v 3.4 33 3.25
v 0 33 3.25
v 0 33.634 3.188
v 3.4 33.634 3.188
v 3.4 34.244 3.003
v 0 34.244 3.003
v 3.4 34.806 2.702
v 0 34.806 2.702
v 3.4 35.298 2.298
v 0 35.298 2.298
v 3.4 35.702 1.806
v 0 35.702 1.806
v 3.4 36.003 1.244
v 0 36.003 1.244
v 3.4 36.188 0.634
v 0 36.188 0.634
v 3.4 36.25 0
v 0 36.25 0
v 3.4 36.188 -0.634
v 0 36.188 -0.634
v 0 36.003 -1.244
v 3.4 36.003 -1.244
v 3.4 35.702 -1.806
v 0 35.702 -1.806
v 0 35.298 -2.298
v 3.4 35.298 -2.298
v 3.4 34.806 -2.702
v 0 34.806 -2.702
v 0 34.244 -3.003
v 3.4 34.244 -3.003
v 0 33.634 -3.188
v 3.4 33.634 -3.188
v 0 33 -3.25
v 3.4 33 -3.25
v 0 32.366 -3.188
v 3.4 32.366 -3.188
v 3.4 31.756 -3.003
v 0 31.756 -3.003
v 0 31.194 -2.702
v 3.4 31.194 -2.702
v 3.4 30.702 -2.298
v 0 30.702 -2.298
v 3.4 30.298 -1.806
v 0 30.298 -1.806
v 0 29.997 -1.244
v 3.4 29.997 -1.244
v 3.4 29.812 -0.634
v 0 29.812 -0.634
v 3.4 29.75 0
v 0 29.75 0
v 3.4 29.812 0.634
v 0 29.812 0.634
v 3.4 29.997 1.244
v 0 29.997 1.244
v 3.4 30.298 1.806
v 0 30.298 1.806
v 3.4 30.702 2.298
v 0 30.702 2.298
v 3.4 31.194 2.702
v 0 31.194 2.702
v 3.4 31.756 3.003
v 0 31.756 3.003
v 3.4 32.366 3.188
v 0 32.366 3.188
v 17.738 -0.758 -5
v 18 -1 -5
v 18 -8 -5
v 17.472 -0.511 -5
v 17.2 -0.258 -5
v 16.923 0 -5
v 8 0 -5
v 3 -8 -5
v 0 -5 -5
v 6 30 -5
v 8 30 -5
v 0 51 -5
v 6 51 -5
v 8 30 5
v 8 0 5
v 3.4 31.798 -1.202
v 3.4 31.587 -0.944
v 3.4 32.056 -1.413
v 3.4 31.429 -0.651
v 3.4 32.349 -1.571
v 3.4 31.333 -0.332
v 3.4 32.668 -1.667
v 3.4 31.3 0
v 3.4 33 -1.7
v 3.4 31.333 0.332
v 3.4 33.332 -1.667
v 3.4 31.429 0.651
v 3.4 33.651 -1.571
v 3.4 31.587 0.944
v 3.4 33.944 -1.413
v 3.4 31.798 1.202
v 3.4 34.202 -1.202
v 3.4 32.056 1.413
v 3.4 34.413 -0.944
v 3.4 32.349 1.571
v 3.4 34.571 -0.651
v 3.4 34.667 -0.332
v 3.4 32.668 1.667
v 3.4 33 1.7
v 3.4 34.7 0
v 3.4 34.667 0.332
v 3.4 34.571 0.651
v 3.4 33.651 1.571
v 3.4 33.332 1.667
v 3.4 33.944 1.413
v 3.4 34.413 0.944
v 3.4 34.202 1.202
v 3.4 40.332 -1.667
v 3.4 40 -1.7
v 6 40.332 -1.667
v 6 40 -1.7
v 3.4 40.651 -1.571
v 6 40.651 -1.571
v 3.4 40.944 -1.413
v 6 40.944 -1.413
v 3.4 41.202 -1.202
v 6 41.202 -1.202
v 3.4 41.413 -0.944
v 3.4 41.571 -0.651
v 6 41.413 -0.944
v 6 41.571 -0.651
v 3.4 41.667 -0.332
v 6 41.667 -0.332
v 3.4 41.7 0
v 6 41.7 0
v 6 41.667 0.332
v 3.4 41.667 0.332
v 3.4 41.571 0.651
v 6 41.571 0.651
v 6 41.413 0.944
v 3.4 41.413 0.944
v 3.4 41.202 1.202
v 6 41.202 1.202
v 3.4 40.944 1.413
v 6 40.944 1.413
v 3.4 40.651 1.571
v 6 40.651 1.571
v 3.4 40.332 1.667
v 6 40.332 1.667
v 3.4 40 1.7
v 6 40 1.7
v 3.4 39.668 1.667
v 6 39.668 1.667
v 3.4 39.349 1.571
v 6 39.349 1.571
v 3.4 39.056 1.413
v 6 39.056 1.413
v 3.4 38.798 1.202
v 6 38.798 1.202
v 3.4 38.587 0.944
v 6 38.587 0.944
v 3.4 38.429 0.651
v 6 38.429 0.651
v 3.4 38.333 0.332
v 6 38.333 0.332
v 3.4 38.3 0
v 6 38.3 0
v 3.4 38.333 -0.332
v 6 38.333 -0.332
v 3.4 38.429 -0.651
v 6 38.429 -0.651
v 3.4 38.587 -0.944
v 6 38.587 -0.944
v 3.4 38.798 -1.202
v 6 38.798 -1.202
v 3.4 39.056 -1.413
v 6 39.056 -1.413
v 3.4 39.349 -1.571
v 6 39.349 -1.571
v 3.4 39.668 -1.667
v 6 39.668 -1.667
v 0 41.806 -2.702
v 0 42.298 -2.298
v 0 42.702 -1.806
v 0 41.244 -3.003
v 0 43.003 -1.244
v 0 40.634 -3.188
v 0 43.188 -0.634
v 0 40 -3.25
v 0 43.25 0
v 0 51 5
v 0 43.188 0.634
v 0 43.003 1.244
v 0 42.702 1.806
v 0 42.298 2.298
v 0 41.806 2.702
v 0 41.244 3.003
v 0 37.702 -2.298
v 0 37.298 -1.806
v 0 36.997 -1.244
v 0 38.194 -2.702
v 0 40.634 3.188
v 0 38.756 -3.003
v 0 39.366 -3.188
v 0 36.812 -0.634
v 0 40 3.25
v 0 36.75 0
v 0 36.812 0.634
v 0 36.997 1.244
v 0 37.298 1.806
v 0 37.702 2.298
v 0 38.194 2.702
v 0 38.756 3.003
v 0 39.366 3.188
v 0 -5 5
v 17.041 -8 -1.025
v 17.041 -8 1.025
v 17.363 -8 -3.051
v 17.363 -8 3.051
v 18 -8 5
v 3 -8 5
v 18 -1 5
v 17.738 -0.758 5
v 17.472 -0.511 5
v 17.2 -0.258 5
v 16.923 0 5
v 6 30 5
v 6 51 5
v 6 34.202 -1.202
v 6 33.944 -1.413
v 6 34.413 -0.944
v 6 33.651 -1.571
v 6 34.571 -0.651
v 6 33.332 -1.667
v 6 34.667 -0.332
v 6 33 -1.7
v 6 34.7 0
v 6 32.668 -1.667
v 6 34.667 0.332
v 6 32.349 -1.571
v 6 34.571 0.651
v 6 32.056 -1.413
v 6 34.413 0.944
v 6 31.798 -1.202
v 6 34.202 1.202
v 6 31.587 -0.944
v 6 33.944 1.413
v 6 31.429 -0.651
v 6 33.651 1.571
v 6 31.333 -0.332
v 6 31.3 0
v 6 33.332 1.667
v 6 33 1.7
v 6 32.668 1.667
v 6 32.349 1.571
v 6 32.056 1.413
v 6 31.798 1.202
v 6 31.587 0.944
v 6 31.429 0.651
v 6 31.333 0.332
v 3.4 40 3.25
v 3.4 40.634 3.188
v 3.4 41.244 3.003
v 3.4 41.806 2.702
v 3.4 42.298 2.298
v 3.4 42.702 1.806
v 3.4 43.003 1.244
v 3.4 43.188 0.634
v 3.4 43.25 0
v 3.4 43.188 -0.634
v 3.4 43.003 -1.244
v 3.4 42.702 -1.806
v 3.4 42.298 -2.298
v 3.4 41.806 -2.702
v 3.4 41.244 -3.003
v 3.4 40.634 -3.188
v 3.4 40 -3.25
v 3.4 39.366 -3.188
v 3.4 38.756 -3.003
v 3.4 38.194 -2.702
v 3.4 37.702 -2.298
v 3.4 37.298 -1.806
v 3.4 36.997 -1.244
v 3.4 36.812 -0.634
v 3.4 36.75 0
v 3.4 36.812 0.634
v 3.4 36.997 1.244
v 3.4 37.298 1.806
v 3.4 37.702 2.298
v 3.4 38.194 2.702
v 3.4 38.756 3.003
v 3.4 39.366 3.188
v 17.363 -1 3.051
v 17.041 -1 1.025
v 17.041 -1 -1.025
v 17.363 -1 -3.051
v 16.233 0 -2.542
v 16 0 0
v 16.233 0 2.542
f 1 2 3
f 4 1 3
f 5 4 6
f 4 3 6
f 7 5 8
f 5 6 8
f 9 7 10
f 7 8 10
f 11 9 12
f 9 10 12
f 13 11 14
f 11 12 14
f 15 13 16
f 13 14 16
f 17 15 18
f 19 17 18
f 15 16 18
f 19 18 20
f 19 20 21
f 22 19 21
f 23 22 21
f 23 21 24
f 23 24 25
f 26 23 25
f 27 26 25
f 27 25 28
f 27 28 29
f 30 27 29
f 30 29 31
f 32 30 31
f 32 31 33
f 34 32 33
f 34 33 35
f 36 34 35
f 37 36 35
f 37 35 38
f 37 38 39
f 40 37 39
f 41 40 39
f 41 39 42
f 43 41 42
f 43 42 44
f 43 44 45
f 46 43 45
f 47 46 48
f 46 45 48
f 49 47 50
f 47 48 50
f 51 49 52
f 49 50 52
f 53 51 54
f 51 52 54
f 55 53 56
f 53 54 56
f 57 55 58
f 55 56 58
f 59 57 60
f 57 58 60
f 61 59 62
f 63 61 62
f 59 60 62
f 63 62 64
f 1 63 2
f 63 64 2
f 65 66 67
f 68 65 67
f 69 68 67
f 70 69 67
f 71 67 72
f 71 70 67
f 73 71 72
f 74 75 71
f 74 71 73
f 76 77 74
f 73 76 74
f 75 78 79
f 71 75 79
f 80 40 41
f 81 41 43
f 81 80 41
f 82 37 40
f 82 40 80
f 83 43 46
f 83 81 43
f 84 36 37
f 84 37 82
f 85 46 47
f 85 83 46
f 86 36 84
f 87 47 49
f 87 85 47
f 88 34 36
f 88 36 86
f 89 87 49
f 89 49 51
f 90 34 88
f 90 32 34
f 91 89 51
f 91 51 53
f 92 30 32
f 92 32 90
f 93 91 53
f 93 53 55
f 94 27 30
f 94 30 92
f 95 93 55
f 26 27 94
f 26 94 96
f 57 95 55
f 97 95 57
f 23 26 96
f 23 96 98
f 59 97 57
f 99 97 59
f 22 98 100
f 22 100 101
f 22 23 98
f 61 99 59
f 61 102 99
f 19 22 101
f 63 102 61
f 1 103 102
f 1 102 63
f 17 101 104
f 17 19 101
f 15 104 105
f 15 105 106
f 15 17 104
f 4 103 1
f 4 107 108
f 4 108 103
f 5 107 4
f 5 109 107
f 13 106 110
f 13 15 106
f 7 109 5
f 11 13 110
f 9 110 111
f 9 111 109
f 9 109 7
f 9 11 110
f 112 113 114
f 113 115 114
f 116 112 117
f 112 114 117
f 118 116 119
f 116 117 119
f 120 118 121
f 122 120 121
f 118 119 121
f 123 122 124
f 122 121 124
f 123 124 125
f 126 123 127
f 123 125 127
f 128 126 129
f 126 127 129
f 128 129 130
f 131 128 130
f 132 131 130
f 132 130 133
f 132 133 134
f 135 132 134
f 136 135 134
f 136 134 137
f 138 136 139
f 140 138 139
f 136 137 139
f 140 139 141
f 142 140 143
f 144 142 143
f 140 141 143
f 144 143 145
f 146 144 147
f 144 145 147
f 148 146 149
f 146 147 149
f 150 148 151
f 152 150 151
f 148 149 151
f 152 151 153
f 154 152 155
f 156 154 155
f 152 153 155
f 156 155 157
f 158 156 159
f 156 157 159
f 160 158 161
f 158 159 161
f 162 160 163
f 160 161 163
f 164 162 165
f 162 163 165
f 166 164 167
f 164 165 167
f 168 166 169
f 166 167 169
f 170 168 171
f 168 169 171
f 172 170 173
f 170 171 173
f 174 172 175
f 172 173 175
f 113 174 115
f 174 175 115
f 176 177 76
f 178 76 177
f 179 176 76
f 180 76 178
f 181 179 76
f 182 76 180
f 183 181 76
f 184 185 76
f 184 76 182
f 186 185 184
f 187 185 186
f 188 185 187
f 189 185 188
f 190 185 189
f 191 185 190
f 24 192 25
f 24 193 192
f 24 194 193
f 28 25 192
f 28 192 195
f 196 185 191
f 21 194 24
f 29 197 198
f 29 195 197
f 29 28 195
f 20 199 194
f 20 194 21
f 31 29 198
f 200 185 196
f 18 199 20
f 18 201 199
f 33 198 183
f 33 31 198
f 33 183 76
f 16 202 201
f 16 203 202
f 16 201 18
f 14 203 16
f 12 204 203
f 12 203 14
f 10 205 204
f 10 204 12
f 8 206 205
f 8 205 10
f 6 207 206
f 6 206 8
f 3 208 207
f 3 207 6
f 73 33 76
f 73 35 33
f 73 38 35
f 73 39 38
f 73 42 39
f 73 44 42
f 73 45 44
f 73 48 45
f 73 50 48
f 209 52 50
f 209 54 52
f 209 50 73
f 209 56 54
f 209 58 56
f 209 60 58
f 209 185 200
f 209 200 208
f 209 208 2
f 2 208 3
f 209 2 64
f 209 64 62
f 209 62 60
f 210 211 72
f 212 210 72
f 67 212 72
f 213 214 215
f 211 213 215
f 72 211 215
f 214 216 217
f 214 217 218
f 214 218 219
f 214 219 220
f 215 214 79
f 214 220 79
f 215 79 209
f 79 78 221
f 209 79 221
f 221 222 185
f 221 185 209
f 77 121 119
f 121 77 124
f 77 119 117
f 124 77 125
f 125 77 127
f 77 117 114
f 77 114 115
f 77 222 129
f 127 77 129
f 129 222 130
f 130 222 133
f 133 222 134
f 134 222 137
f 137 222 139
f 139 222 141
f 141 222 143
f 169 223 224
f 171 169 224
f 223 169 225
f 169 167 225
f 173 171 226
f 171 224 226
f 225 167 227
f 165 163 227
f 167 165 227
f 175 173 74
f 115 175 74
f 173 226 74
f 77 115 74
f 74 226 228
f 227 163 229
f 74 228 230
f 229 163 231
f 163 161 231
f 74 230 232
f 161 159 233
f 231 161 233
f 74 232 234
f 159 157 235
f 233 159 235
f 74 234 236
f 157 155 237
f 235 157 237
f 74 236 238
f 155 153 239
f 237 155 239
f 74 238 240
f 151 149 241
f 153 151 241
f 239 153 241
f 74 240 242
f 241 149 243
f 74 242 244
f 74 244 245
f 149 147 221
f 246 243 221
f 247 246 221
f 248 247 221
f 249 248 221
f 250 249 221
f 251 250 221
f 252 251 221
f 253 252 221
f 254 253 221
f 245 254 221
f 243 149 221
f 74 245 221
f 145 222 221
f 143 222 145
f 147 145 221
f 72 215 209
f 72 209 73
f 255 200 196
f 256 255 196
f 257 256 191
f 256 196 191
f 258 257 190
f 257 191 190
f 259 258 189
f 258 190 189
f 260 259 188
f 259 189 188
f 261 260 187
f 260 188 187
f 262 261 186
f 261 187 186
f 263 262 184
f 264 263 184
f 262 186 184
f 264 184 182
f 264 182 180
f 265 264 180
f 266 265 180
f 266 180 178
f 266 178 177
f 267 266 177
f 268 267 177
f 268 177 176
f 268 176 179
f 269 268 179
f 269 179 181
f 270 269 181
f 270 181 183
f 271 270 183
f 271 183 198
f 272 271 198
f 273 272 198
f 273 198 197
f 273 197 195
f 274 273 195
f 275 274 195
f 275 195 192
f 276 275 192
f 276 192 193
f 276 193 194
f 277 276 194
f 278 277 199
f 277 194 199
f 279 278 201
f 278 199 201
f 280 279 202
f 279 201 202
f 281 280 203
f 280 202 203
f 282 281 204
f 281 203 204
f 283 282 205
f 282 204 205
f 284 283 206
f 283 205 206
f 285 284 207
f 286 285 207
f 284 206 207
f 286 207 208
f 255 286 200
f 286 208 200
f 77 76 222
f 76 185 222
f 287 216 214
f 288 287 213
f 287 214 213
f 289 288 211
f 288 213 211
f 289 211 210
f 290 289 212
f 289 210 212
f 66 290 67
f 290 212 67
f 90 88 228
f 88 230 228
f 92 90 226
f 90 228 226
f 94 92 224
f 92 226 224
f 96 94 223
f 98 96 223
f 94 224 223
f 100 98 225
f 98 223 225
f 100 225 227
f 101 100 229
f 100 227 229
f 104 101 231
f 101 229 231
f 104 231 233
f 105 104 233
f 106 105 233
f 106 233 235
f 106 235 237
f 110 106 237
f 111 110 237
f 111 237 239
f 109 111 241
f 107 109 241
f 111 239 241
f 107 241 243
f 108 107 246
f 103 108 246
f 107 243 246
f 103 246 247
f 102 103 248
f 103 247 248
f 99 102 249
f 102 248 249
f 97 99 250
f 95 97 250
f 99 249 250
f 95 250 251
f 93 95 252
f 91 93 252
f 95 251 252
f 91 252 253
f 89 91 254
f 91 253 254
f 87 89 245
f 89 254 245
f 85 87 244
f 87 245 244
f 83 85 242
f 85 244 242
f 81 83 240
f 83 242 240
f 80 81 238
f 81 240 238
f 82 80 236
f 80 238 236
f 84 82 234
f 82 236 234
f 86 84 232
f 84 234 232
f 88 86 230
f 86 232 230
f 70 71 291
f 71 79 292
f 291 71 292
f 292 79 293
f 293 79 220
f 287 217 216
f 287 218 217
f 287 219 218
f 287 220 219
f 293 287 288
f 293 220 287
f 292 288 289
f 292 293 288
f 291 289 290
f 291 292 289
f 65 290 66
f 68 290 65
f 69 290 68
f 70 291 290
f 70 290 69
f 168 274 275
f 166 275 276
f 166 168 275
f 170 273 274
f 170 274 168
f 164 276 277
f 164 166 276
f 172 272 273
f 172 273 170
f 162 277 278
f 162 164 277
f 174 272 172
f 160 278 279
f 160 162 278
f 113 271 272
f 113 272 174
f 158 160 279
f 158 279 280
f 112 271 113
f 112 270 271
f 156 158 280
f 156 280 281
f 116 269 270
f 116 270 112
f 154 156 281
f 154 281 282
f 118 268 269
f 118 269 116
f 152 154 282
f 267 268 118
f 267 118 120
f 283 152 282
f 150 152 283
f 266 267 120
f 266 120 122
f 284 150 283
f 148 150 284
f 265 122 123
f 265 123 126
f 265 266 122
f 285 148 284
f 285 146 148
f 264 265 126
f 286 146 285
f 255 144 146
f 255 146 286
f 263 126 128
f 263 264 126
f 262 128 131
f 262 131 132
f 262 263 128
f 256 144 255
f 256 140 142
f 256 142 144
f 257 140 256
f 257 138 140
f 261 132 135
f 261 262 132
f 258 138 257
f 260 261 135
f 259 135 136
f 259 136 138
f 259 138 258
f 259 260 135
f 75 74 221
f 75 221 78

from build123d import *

# Parameters (mm, degrees)
BOSS_EXTRU_1_DEPTH                                = 5
ESQUISSE2_R                                       = 13
ENL_V_MAT_EXTRU_1_DEPTH                           = 10
CHANFREIN1_SIZE                                   = 3
CHANFREIN2_SIZE                                   = 1
CHAMBRAGE_POUR_VIS_SIX_PANS_CREUX_M31_D           = 3.4
CHAMBRAGE_POUR_VIS_SIX_PANS_CREUX_M31_CBORE_D     = 6.5
CHAMBRAGE_POUR_VIS_SIX_PANS_CREUX_M31_CBORE_DEPTH = 3.4


with BuildPart() as part:
    # Esquisse1 → Boss.-Extru.1 (new, symmetric)
    with BuildSketch(Plane.XY):
        Polygon((8, 0), (20, 0), (20, -8), (0, -8), (0, 0), (0, 30), (0, 51), (6, 51), (6, 30), (8, 30), align=None)
    extrude(amount=BOSS_EXTRU_1_DEPTH, both=True)

    # Esquisse2 → Enlèv. mat.-Extru.1 (cut)
    with BuildSketch(Plane.XZ.offset(8)):
        with Locations((30, 0)):
            Circle(ESQUISSE2_R)
    extrude(amount=-ENL_V_MAT_EXTRU_1_DEPTH, mode=Mode.SUBTRACT)

    # Chanfrein1
    chanfrein1_edges = [part.edges().sort_by_distance(p)[0] for p in [
        (0, -8, 0),
    ]]
    chamfer(chanfrein1_edges, length=CHANFREIN1_SIZE)

    # Chanfrein2
    chanfrein2_edges = [part.edges().sort_by_distance(p)[0] for p in [
        (17, 0, 0),
    ]]
    chamfer(chanfrein2_edges, length=CHANFREIN2_SIZE)

    # Chambrage pour vis à six pans creux M31 (through all)
    with Locations(Plane.ZY):
        with Locations((0, 40), (0, 33)):
            CounterBoreHole(CHAMBRAGE_POUR_VIS_SIX_PANS_CREUX_M31_D / 2, CHAMBRAGE_POUR_VIS_SIX_PANS_CREUX_M31_CBORE_D / 2, CHAMBRAGE_POUR_VIS_SIX_PANS_CREUX_M31_CBORE_DEPTH)


solid = part.part
